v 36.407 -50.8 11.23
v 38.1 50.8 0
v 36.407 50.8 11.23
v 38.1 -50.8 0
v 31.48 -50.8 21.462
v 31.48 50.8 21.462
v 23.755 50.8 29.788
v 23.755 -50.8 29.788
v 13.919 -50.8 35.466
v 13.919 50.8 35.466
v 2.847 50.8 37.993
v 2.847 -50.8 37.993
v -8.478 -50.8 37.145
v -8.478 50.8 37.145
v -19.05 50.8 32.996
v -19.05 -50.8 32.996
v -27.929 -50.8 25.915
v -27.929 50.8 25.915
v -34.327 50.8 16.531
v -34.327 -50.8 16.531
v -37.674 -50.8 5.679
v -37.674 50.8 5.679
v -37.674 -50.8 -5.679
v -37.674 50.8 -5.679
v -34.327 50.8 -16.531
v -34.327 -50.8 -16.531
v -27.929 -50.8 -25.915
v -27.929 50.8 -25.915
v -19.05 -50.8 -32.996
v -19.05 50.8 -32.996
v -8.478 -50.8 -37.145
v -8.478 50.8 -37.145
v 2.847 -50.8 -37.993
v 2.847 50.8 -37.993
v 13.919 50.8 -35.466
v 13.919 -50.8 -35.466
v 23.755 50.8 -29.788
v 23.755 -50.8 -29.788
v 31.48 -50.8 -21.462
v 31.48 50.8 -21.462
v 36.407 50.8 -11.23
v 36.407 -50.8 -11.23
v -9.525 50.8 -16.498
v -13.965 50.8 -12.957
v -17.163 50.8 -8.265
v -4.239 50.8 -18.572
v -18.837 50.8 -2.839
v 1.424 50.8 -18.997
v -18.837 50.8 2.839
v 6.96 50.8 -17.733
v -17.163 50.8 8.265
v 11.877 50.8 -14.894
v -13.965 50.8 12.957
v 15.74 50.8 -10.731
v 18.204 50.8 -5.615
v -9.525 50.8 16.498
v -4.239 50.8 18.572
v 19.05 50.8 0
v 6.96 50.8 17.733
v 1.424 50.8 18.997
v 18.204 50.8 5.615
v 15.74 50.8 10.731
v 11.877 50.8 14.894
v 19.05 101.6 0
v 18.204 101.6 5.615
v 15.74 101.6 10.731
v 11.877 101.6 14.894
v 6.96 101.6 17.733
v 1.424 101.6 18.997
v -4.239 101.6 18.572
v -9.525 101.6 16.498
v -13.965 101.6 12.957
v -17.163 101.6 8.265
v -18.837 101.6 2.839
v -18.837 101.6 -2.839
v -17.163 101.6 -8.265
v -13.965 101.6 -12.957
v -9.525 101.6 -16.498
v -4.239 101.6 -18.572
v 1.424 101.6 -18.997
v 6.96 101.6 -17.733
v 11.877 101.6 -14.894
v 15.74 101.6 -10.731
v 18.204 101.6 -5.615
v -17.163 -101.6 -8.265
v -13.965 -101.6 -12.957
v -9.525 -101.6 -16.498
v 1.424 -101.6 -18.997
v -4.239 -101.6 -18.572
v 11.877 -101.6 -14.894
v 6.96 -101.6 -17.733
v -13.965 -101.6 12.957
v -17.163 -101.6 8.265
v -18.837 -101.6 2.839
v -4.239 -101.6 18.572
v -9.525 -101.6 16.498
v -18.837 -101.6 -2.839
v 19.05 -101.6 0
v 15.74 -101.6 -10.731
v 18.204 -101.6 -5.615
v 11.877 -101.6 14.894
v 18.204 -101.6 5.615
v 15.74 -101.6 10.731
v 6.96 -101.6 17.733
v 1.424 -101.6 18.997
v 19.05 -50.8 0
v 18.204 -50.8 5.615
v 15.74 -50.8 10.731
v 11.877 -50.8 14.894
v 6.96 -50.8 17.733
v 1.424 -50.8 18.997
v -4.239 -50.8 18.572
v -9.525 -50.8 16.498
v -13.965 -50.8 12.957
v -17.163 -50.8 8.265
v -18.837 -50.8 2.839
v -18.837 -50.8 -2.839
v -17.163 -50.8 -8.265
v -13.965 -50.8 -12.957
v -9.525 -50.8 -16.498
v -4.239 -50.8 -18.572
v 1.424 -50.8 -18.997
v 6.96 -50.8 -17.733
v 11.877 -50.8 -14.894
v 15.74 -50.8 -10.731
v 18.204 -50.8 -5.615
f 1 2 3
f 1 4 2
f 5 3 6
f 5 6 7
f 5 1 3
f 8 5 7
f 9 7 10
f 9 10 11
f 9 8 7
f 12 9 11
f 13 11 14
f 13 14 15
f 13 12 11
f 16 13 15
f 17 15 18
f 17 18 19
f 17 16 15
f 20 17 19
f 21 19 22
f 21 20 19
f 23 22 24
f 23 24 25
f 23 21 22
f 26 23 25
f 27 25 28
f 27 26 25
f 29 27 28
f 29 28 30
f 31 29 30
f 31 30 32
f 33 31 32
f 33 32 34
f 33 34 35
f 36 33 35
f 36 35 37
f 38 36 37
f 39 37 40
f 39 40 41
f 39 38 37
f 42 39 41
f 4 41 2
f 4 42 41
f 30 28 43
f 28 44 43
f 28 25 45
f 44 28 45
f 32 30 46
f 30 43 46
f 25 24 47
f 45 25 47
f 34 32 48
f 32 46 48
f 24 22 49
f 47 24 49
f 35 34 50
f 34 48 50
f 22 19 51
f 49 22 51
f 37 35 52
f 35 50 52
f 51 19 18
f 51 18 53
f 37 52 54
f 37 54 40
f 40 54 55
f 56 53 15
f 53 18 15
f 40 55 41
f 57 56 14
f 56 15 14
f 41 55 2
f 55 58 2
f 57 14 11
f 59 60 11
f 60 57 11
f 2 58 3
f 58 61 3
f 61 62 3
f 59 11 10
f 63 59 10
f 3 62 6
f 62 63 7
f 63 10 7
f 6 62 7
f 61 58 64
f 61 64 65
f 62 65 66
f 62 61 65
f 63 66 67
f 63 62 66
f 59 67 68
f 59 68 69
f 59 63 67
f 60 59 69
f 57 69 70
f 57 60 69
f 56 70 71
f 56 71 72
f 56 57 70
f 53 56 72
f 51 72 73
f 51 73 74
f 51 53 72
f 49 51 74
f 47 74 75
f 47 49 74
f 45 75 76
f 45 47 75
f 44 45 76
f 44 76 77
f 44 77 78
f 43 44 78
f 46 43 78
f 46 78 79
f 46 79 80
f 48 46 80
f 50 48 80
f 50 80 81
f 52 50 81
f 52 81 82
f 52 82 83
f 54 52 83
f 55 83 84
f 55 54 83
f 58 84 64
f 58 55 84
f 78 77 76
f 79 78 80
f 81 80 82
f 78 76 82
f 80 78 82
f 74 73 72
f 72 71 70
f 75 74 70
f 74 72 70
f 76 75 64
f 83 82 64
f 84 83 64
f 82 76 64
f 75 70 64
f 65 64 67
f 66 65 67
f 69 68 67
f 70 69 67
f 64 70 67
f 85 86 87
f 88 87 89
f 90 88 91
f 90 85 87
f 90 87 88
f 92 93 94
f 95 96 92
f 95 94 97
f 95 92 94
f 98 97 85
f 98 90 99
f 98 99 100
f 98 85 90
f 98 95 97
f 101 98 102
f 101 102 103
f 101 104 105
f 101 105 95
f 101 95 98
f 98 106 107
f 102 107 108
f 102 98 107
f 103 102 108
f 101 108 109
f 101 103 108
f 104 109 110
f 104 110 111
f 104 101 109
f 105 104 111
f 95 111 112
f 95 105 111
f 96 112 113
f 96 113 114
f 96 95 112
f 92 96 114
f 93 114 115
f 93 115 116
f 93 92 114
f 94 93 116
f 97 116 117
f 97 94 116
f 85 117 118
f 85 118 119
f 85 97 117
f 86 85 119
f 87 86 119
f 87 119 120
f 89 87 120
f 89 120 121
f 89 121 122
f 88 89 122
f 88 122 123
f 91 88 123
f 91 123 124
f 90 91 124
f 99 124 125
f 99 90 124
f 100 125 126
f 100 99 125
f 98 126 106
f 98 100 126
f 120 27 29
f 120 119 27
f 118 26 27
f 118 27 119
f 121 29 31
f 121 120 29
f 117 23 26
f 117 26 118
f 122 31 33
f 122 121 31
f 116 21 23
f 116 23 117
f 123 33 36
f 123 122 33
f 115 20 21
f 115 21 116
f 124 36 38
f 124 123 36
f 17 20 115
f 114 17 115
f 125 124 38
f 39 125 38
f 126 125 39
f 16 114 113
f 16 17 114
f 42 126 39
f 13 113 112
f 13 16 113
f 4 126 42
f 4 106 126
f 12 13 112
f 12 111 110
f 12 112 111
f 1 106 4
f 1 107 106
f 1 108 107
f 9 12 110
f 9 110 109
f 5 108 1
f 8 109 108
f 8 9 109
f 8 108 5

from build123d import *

# Parameters (mm, degrees)
F1_R     = 19.05
F2_DEPTH = 101.6
F0_R     = 38.1
F3_DEPTH = 50.8


with BuildPart() as f2:
    # F1 (on Front) → F2 (new body, symmetric)
    with BuildSketch(Plane.XZ):
        Circle(F1_R)
    extrude(amount=F2_DEPTH, both=True)

    # F0 (on Front) → F3 (join, symmetric)
    with BuildSketch(Plane.XZ):
        Circle(F0_R)
    extrude(amount=F3_DEPTH, both=True)


solid = f2.part
